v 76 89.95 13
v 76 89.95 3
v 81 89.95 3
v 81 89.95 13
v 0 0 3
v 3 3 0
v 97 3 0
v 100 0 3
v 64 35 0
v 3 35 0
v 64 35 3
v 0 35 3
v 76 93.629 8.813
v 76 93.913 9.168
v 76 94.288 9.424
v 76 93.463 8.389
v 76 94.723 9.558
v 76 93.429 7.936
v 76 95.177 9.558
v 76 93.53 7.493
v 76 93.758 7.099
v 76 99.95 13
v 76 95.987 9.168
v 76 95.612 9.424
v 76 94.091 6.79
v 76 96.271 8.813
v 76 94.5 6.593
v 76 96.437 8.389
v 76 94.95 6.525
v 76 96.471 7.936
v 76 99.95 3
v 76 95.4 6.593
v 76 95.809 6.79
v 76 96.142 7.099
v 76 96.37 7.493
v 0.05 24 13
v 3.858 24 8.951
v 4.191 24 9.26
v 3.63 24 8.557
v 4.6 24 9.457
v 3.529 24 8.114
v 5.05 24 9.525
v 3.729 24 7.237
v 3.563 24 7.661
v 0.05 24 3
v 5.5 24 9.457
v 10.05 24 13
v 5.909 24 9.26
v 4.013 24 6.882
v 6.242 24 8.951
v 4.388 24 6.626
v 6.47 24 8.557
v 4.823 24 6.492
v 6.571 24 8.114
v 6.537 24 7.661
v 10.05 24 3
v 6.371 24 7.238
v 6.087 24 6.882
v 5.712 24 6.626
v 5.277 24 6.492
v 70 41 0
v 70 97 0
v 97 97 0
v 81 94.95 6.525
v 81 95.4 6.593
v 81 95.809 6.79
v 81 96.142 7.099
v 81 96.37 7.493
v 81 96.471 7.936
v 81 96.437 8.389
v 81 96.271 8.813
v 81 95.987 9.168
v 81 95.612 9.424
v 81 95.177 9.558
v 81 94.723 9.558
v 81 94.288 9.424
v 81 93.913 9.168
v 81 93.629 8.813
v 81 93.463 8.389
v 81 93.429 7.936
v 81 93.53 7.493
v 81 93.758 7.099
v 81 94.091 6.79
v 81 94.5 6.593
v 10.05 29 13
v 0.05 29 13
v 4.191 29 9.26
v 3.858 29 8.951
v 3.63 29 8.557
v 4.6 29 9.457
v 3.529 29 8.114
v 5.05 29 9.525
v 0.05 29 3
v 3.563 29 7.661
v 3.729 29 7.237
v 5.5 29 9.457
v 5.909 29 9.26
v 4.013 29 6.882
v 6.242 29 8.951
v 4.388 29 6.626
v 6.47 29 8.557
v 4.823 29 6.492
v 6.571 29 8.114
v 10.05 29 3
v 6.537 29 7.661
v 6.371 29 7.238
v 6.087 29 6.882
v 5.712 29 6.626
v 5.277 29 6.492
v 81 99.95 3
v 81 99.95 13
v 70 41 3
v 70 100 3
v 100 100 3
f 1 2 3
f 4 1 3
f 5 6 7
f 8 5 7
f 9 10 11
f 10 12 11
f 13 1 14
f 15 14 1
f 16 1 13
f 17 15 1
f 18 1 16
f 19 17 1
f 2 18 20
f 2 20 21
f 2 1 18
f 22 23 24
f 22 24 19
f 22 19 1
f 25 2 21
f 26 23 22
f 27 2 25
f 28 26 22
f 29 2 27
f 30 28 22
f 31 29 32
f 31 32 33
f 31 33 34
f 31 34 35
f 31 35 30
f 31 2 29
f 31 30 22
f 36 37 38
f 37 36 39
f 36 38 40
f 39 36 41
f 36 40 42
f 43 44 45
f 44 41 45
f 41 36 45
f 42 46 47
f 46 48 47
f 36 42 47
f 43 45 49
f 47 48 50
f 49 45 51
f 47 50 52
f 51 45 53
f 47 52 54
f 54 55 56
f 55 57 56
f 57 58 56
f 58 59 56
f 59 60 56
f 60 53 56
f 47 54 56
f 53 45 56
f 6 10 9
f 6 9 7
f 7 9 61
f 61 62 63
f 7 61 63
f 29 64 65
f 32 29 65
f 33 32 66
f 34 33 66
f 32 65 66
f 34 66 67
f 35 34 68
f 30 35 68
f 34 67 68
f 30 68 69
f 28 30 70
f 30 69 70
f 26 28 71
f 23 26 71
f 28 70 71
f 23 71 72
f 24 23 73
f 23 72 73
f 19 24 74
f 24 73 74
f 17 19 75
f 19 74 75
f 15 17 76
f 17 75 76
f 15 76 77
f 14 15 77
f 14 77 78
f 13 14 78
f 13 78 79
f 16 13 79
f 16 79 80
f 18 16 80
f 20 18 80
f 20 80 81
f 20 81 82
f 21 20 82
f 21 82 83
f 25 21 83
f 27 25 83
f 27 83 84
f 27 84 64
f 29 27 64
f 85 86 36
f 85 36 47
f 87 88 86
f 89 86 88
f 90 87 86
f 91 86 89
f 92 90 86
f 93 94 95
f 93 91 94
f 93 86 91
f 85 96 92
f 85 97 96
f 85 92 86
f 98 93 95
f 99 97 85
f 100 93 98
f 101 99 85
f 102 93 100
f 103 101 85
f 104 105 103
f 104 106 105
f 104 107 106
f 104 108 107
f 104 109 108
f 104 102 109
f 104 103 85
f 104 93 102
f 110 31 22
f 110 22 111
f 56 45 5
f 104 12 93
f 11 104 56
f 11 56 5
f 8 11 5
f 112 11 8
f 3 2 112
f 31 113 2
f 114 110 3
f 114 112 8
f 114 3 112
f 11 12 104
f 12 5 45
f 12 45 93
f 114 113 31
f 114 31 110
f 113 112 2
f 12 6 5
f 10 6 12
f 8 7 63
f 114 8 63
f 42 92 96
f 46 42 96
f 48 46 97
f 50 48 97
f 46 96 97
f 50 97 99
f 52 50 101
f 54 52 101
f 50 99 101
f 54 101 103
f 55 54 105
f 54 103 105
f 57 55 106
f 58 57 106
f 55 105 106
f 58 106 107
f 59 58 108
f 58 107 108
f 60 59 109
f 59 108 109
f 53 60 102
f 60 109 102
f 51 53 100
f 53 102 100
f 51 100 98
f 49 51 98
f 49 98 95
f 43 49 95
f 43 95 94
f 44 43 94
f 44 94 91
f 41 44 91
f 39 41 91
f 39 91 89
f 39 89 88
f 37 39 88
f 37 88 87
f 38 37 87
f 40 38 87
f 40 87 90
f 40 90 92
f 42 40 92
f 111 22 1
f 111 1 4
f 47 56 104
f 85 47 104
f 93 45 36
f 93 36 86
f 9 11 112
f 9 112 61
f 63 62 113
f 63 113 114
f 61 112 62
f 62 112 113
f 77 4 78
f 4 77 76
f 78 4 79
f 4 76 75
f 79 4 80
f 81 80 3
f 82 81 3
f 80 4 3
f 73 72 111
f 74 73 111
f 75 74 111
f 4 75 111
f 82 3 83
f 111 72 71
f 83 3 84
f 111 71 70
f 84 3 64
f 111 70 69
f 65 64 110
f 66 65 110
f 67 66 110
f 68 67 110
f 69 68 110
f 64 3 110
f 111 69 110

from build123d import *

# Parameters (mm, degrees)
ESQUISSE1_W             = 100
ESQUISSE1_H             = 100
BOSS_EXTRU_1_DEPTH      = 3
CHANFREIN2_SIZE         = 3
ESQUISSE4_W             = 5
ESQUISSE4_H             = 10
ESQUISSE4_W_2           = 10
ESQUISSE4_H_2           = 5
BOSS_EXTRU_3_DEPTH      = 10
ESQUISSE5_R             = 1.525
ENL_V_MAT_EXTRU_2_DEPTH = 10
ESQUISSE6_R             = 1.525
ENL_V_MAT_EXTRU_3_DEPTH = 10
ESQUISSE7_W             = 70
ESQUISSE7_H             = 65
ENL_V_MAT_EXTRU_4_DEPTH = 10
CHANFREIN3_SIZE         = 6


with BuildPart() as part:
    # Esquisse1 → Boss.-Extru.1 (new body)
    with BuildSketch(Plane.XY):
        with Locations((50, 50)):
            Rectangle(ESQUISSE1_W, ESQUISSE1_H)
    extrude(amount=BOSS_EXTRU_1_DEPTH)

    # Chanfrein2
    chanfrein2_edges = [part.edges().sort_by_distance(p)[0] for p in [
        (50, 0, 0),
        (100, 50, 0),
        (50, 100, 0),
        (0, 50, 0),
    ]]
    chamfer(chanfrein2_edges, length=CHANFREIN2_SIZE - 0.0001)  # a hair under: the kernel refuses the full size

    # Esquisse4 → Boss.-Extru.3 (add)
    with BuildSketch(Plane.XY.offset(3)):
        with Locations((78.5, 94.95)):
            Rectangle(ESQUISSE4_W, ESQUISSE4_H)
        with Locations((5.05, 26.5)):
            Rectangle(ESQUISSE4_W_2, ESQUISSE4_H_2)
    extrude(amount=BOSS_EXTRU_3_DEPTH)

    # Esquisse5 → Enlèv. mat.-Extru.2 (cut)
    with BuildSketch(Plane(origin=(81, 0, 0), x_dir=(0, 0, -1), z_dir=(1, 0, 0))):
        with Locations((-8.05, 94.95)):
            Circle(ESQUISSE5_R)
    extrude(amount=-ENL_V_MAT_EXTRU_2_DEPTH, mode=Mode.SUBTRACT)

    # Esquisse6 → Enlèv. mat.-Extru.3 (cut)
    with BuildSketch(Plane(origin=(0, 29, 0), x_dir=(1, 0, 0), z_dir=(0, 1, 0))):
        with Locations(Location((5.05, -8, 0), (0, 0, 270))):
            Circle(ESQUISSE6_R)
    extrude(amount=-ENL_V_MAT_EXTRU_3_DEPTH, mode=Mode.SUBTRACT)

    # Esquisse7 → Enlèv. mat.-Extru.4 (cut)
    with BuildSketch(Plane.XY.offset(3)):
        with Locations((35, 67.5)):
            Rectangle(ESQUISSE7_W, ESQUISSE7_H)
    extrude(amount=-ENL_V_MAT_EXTRU_4_DEPTH, mode=Mode.SUBTRACT)

    # Chanfrein3
    chanfrein3_edges = [part.edges().sort_by_distance(p)[0] for p in [
        (70, 35, 1.5),
    ]]
    chamfer(chanfrein3_edges, length=CHANFREIN3_SIZE)


solid = part.part
